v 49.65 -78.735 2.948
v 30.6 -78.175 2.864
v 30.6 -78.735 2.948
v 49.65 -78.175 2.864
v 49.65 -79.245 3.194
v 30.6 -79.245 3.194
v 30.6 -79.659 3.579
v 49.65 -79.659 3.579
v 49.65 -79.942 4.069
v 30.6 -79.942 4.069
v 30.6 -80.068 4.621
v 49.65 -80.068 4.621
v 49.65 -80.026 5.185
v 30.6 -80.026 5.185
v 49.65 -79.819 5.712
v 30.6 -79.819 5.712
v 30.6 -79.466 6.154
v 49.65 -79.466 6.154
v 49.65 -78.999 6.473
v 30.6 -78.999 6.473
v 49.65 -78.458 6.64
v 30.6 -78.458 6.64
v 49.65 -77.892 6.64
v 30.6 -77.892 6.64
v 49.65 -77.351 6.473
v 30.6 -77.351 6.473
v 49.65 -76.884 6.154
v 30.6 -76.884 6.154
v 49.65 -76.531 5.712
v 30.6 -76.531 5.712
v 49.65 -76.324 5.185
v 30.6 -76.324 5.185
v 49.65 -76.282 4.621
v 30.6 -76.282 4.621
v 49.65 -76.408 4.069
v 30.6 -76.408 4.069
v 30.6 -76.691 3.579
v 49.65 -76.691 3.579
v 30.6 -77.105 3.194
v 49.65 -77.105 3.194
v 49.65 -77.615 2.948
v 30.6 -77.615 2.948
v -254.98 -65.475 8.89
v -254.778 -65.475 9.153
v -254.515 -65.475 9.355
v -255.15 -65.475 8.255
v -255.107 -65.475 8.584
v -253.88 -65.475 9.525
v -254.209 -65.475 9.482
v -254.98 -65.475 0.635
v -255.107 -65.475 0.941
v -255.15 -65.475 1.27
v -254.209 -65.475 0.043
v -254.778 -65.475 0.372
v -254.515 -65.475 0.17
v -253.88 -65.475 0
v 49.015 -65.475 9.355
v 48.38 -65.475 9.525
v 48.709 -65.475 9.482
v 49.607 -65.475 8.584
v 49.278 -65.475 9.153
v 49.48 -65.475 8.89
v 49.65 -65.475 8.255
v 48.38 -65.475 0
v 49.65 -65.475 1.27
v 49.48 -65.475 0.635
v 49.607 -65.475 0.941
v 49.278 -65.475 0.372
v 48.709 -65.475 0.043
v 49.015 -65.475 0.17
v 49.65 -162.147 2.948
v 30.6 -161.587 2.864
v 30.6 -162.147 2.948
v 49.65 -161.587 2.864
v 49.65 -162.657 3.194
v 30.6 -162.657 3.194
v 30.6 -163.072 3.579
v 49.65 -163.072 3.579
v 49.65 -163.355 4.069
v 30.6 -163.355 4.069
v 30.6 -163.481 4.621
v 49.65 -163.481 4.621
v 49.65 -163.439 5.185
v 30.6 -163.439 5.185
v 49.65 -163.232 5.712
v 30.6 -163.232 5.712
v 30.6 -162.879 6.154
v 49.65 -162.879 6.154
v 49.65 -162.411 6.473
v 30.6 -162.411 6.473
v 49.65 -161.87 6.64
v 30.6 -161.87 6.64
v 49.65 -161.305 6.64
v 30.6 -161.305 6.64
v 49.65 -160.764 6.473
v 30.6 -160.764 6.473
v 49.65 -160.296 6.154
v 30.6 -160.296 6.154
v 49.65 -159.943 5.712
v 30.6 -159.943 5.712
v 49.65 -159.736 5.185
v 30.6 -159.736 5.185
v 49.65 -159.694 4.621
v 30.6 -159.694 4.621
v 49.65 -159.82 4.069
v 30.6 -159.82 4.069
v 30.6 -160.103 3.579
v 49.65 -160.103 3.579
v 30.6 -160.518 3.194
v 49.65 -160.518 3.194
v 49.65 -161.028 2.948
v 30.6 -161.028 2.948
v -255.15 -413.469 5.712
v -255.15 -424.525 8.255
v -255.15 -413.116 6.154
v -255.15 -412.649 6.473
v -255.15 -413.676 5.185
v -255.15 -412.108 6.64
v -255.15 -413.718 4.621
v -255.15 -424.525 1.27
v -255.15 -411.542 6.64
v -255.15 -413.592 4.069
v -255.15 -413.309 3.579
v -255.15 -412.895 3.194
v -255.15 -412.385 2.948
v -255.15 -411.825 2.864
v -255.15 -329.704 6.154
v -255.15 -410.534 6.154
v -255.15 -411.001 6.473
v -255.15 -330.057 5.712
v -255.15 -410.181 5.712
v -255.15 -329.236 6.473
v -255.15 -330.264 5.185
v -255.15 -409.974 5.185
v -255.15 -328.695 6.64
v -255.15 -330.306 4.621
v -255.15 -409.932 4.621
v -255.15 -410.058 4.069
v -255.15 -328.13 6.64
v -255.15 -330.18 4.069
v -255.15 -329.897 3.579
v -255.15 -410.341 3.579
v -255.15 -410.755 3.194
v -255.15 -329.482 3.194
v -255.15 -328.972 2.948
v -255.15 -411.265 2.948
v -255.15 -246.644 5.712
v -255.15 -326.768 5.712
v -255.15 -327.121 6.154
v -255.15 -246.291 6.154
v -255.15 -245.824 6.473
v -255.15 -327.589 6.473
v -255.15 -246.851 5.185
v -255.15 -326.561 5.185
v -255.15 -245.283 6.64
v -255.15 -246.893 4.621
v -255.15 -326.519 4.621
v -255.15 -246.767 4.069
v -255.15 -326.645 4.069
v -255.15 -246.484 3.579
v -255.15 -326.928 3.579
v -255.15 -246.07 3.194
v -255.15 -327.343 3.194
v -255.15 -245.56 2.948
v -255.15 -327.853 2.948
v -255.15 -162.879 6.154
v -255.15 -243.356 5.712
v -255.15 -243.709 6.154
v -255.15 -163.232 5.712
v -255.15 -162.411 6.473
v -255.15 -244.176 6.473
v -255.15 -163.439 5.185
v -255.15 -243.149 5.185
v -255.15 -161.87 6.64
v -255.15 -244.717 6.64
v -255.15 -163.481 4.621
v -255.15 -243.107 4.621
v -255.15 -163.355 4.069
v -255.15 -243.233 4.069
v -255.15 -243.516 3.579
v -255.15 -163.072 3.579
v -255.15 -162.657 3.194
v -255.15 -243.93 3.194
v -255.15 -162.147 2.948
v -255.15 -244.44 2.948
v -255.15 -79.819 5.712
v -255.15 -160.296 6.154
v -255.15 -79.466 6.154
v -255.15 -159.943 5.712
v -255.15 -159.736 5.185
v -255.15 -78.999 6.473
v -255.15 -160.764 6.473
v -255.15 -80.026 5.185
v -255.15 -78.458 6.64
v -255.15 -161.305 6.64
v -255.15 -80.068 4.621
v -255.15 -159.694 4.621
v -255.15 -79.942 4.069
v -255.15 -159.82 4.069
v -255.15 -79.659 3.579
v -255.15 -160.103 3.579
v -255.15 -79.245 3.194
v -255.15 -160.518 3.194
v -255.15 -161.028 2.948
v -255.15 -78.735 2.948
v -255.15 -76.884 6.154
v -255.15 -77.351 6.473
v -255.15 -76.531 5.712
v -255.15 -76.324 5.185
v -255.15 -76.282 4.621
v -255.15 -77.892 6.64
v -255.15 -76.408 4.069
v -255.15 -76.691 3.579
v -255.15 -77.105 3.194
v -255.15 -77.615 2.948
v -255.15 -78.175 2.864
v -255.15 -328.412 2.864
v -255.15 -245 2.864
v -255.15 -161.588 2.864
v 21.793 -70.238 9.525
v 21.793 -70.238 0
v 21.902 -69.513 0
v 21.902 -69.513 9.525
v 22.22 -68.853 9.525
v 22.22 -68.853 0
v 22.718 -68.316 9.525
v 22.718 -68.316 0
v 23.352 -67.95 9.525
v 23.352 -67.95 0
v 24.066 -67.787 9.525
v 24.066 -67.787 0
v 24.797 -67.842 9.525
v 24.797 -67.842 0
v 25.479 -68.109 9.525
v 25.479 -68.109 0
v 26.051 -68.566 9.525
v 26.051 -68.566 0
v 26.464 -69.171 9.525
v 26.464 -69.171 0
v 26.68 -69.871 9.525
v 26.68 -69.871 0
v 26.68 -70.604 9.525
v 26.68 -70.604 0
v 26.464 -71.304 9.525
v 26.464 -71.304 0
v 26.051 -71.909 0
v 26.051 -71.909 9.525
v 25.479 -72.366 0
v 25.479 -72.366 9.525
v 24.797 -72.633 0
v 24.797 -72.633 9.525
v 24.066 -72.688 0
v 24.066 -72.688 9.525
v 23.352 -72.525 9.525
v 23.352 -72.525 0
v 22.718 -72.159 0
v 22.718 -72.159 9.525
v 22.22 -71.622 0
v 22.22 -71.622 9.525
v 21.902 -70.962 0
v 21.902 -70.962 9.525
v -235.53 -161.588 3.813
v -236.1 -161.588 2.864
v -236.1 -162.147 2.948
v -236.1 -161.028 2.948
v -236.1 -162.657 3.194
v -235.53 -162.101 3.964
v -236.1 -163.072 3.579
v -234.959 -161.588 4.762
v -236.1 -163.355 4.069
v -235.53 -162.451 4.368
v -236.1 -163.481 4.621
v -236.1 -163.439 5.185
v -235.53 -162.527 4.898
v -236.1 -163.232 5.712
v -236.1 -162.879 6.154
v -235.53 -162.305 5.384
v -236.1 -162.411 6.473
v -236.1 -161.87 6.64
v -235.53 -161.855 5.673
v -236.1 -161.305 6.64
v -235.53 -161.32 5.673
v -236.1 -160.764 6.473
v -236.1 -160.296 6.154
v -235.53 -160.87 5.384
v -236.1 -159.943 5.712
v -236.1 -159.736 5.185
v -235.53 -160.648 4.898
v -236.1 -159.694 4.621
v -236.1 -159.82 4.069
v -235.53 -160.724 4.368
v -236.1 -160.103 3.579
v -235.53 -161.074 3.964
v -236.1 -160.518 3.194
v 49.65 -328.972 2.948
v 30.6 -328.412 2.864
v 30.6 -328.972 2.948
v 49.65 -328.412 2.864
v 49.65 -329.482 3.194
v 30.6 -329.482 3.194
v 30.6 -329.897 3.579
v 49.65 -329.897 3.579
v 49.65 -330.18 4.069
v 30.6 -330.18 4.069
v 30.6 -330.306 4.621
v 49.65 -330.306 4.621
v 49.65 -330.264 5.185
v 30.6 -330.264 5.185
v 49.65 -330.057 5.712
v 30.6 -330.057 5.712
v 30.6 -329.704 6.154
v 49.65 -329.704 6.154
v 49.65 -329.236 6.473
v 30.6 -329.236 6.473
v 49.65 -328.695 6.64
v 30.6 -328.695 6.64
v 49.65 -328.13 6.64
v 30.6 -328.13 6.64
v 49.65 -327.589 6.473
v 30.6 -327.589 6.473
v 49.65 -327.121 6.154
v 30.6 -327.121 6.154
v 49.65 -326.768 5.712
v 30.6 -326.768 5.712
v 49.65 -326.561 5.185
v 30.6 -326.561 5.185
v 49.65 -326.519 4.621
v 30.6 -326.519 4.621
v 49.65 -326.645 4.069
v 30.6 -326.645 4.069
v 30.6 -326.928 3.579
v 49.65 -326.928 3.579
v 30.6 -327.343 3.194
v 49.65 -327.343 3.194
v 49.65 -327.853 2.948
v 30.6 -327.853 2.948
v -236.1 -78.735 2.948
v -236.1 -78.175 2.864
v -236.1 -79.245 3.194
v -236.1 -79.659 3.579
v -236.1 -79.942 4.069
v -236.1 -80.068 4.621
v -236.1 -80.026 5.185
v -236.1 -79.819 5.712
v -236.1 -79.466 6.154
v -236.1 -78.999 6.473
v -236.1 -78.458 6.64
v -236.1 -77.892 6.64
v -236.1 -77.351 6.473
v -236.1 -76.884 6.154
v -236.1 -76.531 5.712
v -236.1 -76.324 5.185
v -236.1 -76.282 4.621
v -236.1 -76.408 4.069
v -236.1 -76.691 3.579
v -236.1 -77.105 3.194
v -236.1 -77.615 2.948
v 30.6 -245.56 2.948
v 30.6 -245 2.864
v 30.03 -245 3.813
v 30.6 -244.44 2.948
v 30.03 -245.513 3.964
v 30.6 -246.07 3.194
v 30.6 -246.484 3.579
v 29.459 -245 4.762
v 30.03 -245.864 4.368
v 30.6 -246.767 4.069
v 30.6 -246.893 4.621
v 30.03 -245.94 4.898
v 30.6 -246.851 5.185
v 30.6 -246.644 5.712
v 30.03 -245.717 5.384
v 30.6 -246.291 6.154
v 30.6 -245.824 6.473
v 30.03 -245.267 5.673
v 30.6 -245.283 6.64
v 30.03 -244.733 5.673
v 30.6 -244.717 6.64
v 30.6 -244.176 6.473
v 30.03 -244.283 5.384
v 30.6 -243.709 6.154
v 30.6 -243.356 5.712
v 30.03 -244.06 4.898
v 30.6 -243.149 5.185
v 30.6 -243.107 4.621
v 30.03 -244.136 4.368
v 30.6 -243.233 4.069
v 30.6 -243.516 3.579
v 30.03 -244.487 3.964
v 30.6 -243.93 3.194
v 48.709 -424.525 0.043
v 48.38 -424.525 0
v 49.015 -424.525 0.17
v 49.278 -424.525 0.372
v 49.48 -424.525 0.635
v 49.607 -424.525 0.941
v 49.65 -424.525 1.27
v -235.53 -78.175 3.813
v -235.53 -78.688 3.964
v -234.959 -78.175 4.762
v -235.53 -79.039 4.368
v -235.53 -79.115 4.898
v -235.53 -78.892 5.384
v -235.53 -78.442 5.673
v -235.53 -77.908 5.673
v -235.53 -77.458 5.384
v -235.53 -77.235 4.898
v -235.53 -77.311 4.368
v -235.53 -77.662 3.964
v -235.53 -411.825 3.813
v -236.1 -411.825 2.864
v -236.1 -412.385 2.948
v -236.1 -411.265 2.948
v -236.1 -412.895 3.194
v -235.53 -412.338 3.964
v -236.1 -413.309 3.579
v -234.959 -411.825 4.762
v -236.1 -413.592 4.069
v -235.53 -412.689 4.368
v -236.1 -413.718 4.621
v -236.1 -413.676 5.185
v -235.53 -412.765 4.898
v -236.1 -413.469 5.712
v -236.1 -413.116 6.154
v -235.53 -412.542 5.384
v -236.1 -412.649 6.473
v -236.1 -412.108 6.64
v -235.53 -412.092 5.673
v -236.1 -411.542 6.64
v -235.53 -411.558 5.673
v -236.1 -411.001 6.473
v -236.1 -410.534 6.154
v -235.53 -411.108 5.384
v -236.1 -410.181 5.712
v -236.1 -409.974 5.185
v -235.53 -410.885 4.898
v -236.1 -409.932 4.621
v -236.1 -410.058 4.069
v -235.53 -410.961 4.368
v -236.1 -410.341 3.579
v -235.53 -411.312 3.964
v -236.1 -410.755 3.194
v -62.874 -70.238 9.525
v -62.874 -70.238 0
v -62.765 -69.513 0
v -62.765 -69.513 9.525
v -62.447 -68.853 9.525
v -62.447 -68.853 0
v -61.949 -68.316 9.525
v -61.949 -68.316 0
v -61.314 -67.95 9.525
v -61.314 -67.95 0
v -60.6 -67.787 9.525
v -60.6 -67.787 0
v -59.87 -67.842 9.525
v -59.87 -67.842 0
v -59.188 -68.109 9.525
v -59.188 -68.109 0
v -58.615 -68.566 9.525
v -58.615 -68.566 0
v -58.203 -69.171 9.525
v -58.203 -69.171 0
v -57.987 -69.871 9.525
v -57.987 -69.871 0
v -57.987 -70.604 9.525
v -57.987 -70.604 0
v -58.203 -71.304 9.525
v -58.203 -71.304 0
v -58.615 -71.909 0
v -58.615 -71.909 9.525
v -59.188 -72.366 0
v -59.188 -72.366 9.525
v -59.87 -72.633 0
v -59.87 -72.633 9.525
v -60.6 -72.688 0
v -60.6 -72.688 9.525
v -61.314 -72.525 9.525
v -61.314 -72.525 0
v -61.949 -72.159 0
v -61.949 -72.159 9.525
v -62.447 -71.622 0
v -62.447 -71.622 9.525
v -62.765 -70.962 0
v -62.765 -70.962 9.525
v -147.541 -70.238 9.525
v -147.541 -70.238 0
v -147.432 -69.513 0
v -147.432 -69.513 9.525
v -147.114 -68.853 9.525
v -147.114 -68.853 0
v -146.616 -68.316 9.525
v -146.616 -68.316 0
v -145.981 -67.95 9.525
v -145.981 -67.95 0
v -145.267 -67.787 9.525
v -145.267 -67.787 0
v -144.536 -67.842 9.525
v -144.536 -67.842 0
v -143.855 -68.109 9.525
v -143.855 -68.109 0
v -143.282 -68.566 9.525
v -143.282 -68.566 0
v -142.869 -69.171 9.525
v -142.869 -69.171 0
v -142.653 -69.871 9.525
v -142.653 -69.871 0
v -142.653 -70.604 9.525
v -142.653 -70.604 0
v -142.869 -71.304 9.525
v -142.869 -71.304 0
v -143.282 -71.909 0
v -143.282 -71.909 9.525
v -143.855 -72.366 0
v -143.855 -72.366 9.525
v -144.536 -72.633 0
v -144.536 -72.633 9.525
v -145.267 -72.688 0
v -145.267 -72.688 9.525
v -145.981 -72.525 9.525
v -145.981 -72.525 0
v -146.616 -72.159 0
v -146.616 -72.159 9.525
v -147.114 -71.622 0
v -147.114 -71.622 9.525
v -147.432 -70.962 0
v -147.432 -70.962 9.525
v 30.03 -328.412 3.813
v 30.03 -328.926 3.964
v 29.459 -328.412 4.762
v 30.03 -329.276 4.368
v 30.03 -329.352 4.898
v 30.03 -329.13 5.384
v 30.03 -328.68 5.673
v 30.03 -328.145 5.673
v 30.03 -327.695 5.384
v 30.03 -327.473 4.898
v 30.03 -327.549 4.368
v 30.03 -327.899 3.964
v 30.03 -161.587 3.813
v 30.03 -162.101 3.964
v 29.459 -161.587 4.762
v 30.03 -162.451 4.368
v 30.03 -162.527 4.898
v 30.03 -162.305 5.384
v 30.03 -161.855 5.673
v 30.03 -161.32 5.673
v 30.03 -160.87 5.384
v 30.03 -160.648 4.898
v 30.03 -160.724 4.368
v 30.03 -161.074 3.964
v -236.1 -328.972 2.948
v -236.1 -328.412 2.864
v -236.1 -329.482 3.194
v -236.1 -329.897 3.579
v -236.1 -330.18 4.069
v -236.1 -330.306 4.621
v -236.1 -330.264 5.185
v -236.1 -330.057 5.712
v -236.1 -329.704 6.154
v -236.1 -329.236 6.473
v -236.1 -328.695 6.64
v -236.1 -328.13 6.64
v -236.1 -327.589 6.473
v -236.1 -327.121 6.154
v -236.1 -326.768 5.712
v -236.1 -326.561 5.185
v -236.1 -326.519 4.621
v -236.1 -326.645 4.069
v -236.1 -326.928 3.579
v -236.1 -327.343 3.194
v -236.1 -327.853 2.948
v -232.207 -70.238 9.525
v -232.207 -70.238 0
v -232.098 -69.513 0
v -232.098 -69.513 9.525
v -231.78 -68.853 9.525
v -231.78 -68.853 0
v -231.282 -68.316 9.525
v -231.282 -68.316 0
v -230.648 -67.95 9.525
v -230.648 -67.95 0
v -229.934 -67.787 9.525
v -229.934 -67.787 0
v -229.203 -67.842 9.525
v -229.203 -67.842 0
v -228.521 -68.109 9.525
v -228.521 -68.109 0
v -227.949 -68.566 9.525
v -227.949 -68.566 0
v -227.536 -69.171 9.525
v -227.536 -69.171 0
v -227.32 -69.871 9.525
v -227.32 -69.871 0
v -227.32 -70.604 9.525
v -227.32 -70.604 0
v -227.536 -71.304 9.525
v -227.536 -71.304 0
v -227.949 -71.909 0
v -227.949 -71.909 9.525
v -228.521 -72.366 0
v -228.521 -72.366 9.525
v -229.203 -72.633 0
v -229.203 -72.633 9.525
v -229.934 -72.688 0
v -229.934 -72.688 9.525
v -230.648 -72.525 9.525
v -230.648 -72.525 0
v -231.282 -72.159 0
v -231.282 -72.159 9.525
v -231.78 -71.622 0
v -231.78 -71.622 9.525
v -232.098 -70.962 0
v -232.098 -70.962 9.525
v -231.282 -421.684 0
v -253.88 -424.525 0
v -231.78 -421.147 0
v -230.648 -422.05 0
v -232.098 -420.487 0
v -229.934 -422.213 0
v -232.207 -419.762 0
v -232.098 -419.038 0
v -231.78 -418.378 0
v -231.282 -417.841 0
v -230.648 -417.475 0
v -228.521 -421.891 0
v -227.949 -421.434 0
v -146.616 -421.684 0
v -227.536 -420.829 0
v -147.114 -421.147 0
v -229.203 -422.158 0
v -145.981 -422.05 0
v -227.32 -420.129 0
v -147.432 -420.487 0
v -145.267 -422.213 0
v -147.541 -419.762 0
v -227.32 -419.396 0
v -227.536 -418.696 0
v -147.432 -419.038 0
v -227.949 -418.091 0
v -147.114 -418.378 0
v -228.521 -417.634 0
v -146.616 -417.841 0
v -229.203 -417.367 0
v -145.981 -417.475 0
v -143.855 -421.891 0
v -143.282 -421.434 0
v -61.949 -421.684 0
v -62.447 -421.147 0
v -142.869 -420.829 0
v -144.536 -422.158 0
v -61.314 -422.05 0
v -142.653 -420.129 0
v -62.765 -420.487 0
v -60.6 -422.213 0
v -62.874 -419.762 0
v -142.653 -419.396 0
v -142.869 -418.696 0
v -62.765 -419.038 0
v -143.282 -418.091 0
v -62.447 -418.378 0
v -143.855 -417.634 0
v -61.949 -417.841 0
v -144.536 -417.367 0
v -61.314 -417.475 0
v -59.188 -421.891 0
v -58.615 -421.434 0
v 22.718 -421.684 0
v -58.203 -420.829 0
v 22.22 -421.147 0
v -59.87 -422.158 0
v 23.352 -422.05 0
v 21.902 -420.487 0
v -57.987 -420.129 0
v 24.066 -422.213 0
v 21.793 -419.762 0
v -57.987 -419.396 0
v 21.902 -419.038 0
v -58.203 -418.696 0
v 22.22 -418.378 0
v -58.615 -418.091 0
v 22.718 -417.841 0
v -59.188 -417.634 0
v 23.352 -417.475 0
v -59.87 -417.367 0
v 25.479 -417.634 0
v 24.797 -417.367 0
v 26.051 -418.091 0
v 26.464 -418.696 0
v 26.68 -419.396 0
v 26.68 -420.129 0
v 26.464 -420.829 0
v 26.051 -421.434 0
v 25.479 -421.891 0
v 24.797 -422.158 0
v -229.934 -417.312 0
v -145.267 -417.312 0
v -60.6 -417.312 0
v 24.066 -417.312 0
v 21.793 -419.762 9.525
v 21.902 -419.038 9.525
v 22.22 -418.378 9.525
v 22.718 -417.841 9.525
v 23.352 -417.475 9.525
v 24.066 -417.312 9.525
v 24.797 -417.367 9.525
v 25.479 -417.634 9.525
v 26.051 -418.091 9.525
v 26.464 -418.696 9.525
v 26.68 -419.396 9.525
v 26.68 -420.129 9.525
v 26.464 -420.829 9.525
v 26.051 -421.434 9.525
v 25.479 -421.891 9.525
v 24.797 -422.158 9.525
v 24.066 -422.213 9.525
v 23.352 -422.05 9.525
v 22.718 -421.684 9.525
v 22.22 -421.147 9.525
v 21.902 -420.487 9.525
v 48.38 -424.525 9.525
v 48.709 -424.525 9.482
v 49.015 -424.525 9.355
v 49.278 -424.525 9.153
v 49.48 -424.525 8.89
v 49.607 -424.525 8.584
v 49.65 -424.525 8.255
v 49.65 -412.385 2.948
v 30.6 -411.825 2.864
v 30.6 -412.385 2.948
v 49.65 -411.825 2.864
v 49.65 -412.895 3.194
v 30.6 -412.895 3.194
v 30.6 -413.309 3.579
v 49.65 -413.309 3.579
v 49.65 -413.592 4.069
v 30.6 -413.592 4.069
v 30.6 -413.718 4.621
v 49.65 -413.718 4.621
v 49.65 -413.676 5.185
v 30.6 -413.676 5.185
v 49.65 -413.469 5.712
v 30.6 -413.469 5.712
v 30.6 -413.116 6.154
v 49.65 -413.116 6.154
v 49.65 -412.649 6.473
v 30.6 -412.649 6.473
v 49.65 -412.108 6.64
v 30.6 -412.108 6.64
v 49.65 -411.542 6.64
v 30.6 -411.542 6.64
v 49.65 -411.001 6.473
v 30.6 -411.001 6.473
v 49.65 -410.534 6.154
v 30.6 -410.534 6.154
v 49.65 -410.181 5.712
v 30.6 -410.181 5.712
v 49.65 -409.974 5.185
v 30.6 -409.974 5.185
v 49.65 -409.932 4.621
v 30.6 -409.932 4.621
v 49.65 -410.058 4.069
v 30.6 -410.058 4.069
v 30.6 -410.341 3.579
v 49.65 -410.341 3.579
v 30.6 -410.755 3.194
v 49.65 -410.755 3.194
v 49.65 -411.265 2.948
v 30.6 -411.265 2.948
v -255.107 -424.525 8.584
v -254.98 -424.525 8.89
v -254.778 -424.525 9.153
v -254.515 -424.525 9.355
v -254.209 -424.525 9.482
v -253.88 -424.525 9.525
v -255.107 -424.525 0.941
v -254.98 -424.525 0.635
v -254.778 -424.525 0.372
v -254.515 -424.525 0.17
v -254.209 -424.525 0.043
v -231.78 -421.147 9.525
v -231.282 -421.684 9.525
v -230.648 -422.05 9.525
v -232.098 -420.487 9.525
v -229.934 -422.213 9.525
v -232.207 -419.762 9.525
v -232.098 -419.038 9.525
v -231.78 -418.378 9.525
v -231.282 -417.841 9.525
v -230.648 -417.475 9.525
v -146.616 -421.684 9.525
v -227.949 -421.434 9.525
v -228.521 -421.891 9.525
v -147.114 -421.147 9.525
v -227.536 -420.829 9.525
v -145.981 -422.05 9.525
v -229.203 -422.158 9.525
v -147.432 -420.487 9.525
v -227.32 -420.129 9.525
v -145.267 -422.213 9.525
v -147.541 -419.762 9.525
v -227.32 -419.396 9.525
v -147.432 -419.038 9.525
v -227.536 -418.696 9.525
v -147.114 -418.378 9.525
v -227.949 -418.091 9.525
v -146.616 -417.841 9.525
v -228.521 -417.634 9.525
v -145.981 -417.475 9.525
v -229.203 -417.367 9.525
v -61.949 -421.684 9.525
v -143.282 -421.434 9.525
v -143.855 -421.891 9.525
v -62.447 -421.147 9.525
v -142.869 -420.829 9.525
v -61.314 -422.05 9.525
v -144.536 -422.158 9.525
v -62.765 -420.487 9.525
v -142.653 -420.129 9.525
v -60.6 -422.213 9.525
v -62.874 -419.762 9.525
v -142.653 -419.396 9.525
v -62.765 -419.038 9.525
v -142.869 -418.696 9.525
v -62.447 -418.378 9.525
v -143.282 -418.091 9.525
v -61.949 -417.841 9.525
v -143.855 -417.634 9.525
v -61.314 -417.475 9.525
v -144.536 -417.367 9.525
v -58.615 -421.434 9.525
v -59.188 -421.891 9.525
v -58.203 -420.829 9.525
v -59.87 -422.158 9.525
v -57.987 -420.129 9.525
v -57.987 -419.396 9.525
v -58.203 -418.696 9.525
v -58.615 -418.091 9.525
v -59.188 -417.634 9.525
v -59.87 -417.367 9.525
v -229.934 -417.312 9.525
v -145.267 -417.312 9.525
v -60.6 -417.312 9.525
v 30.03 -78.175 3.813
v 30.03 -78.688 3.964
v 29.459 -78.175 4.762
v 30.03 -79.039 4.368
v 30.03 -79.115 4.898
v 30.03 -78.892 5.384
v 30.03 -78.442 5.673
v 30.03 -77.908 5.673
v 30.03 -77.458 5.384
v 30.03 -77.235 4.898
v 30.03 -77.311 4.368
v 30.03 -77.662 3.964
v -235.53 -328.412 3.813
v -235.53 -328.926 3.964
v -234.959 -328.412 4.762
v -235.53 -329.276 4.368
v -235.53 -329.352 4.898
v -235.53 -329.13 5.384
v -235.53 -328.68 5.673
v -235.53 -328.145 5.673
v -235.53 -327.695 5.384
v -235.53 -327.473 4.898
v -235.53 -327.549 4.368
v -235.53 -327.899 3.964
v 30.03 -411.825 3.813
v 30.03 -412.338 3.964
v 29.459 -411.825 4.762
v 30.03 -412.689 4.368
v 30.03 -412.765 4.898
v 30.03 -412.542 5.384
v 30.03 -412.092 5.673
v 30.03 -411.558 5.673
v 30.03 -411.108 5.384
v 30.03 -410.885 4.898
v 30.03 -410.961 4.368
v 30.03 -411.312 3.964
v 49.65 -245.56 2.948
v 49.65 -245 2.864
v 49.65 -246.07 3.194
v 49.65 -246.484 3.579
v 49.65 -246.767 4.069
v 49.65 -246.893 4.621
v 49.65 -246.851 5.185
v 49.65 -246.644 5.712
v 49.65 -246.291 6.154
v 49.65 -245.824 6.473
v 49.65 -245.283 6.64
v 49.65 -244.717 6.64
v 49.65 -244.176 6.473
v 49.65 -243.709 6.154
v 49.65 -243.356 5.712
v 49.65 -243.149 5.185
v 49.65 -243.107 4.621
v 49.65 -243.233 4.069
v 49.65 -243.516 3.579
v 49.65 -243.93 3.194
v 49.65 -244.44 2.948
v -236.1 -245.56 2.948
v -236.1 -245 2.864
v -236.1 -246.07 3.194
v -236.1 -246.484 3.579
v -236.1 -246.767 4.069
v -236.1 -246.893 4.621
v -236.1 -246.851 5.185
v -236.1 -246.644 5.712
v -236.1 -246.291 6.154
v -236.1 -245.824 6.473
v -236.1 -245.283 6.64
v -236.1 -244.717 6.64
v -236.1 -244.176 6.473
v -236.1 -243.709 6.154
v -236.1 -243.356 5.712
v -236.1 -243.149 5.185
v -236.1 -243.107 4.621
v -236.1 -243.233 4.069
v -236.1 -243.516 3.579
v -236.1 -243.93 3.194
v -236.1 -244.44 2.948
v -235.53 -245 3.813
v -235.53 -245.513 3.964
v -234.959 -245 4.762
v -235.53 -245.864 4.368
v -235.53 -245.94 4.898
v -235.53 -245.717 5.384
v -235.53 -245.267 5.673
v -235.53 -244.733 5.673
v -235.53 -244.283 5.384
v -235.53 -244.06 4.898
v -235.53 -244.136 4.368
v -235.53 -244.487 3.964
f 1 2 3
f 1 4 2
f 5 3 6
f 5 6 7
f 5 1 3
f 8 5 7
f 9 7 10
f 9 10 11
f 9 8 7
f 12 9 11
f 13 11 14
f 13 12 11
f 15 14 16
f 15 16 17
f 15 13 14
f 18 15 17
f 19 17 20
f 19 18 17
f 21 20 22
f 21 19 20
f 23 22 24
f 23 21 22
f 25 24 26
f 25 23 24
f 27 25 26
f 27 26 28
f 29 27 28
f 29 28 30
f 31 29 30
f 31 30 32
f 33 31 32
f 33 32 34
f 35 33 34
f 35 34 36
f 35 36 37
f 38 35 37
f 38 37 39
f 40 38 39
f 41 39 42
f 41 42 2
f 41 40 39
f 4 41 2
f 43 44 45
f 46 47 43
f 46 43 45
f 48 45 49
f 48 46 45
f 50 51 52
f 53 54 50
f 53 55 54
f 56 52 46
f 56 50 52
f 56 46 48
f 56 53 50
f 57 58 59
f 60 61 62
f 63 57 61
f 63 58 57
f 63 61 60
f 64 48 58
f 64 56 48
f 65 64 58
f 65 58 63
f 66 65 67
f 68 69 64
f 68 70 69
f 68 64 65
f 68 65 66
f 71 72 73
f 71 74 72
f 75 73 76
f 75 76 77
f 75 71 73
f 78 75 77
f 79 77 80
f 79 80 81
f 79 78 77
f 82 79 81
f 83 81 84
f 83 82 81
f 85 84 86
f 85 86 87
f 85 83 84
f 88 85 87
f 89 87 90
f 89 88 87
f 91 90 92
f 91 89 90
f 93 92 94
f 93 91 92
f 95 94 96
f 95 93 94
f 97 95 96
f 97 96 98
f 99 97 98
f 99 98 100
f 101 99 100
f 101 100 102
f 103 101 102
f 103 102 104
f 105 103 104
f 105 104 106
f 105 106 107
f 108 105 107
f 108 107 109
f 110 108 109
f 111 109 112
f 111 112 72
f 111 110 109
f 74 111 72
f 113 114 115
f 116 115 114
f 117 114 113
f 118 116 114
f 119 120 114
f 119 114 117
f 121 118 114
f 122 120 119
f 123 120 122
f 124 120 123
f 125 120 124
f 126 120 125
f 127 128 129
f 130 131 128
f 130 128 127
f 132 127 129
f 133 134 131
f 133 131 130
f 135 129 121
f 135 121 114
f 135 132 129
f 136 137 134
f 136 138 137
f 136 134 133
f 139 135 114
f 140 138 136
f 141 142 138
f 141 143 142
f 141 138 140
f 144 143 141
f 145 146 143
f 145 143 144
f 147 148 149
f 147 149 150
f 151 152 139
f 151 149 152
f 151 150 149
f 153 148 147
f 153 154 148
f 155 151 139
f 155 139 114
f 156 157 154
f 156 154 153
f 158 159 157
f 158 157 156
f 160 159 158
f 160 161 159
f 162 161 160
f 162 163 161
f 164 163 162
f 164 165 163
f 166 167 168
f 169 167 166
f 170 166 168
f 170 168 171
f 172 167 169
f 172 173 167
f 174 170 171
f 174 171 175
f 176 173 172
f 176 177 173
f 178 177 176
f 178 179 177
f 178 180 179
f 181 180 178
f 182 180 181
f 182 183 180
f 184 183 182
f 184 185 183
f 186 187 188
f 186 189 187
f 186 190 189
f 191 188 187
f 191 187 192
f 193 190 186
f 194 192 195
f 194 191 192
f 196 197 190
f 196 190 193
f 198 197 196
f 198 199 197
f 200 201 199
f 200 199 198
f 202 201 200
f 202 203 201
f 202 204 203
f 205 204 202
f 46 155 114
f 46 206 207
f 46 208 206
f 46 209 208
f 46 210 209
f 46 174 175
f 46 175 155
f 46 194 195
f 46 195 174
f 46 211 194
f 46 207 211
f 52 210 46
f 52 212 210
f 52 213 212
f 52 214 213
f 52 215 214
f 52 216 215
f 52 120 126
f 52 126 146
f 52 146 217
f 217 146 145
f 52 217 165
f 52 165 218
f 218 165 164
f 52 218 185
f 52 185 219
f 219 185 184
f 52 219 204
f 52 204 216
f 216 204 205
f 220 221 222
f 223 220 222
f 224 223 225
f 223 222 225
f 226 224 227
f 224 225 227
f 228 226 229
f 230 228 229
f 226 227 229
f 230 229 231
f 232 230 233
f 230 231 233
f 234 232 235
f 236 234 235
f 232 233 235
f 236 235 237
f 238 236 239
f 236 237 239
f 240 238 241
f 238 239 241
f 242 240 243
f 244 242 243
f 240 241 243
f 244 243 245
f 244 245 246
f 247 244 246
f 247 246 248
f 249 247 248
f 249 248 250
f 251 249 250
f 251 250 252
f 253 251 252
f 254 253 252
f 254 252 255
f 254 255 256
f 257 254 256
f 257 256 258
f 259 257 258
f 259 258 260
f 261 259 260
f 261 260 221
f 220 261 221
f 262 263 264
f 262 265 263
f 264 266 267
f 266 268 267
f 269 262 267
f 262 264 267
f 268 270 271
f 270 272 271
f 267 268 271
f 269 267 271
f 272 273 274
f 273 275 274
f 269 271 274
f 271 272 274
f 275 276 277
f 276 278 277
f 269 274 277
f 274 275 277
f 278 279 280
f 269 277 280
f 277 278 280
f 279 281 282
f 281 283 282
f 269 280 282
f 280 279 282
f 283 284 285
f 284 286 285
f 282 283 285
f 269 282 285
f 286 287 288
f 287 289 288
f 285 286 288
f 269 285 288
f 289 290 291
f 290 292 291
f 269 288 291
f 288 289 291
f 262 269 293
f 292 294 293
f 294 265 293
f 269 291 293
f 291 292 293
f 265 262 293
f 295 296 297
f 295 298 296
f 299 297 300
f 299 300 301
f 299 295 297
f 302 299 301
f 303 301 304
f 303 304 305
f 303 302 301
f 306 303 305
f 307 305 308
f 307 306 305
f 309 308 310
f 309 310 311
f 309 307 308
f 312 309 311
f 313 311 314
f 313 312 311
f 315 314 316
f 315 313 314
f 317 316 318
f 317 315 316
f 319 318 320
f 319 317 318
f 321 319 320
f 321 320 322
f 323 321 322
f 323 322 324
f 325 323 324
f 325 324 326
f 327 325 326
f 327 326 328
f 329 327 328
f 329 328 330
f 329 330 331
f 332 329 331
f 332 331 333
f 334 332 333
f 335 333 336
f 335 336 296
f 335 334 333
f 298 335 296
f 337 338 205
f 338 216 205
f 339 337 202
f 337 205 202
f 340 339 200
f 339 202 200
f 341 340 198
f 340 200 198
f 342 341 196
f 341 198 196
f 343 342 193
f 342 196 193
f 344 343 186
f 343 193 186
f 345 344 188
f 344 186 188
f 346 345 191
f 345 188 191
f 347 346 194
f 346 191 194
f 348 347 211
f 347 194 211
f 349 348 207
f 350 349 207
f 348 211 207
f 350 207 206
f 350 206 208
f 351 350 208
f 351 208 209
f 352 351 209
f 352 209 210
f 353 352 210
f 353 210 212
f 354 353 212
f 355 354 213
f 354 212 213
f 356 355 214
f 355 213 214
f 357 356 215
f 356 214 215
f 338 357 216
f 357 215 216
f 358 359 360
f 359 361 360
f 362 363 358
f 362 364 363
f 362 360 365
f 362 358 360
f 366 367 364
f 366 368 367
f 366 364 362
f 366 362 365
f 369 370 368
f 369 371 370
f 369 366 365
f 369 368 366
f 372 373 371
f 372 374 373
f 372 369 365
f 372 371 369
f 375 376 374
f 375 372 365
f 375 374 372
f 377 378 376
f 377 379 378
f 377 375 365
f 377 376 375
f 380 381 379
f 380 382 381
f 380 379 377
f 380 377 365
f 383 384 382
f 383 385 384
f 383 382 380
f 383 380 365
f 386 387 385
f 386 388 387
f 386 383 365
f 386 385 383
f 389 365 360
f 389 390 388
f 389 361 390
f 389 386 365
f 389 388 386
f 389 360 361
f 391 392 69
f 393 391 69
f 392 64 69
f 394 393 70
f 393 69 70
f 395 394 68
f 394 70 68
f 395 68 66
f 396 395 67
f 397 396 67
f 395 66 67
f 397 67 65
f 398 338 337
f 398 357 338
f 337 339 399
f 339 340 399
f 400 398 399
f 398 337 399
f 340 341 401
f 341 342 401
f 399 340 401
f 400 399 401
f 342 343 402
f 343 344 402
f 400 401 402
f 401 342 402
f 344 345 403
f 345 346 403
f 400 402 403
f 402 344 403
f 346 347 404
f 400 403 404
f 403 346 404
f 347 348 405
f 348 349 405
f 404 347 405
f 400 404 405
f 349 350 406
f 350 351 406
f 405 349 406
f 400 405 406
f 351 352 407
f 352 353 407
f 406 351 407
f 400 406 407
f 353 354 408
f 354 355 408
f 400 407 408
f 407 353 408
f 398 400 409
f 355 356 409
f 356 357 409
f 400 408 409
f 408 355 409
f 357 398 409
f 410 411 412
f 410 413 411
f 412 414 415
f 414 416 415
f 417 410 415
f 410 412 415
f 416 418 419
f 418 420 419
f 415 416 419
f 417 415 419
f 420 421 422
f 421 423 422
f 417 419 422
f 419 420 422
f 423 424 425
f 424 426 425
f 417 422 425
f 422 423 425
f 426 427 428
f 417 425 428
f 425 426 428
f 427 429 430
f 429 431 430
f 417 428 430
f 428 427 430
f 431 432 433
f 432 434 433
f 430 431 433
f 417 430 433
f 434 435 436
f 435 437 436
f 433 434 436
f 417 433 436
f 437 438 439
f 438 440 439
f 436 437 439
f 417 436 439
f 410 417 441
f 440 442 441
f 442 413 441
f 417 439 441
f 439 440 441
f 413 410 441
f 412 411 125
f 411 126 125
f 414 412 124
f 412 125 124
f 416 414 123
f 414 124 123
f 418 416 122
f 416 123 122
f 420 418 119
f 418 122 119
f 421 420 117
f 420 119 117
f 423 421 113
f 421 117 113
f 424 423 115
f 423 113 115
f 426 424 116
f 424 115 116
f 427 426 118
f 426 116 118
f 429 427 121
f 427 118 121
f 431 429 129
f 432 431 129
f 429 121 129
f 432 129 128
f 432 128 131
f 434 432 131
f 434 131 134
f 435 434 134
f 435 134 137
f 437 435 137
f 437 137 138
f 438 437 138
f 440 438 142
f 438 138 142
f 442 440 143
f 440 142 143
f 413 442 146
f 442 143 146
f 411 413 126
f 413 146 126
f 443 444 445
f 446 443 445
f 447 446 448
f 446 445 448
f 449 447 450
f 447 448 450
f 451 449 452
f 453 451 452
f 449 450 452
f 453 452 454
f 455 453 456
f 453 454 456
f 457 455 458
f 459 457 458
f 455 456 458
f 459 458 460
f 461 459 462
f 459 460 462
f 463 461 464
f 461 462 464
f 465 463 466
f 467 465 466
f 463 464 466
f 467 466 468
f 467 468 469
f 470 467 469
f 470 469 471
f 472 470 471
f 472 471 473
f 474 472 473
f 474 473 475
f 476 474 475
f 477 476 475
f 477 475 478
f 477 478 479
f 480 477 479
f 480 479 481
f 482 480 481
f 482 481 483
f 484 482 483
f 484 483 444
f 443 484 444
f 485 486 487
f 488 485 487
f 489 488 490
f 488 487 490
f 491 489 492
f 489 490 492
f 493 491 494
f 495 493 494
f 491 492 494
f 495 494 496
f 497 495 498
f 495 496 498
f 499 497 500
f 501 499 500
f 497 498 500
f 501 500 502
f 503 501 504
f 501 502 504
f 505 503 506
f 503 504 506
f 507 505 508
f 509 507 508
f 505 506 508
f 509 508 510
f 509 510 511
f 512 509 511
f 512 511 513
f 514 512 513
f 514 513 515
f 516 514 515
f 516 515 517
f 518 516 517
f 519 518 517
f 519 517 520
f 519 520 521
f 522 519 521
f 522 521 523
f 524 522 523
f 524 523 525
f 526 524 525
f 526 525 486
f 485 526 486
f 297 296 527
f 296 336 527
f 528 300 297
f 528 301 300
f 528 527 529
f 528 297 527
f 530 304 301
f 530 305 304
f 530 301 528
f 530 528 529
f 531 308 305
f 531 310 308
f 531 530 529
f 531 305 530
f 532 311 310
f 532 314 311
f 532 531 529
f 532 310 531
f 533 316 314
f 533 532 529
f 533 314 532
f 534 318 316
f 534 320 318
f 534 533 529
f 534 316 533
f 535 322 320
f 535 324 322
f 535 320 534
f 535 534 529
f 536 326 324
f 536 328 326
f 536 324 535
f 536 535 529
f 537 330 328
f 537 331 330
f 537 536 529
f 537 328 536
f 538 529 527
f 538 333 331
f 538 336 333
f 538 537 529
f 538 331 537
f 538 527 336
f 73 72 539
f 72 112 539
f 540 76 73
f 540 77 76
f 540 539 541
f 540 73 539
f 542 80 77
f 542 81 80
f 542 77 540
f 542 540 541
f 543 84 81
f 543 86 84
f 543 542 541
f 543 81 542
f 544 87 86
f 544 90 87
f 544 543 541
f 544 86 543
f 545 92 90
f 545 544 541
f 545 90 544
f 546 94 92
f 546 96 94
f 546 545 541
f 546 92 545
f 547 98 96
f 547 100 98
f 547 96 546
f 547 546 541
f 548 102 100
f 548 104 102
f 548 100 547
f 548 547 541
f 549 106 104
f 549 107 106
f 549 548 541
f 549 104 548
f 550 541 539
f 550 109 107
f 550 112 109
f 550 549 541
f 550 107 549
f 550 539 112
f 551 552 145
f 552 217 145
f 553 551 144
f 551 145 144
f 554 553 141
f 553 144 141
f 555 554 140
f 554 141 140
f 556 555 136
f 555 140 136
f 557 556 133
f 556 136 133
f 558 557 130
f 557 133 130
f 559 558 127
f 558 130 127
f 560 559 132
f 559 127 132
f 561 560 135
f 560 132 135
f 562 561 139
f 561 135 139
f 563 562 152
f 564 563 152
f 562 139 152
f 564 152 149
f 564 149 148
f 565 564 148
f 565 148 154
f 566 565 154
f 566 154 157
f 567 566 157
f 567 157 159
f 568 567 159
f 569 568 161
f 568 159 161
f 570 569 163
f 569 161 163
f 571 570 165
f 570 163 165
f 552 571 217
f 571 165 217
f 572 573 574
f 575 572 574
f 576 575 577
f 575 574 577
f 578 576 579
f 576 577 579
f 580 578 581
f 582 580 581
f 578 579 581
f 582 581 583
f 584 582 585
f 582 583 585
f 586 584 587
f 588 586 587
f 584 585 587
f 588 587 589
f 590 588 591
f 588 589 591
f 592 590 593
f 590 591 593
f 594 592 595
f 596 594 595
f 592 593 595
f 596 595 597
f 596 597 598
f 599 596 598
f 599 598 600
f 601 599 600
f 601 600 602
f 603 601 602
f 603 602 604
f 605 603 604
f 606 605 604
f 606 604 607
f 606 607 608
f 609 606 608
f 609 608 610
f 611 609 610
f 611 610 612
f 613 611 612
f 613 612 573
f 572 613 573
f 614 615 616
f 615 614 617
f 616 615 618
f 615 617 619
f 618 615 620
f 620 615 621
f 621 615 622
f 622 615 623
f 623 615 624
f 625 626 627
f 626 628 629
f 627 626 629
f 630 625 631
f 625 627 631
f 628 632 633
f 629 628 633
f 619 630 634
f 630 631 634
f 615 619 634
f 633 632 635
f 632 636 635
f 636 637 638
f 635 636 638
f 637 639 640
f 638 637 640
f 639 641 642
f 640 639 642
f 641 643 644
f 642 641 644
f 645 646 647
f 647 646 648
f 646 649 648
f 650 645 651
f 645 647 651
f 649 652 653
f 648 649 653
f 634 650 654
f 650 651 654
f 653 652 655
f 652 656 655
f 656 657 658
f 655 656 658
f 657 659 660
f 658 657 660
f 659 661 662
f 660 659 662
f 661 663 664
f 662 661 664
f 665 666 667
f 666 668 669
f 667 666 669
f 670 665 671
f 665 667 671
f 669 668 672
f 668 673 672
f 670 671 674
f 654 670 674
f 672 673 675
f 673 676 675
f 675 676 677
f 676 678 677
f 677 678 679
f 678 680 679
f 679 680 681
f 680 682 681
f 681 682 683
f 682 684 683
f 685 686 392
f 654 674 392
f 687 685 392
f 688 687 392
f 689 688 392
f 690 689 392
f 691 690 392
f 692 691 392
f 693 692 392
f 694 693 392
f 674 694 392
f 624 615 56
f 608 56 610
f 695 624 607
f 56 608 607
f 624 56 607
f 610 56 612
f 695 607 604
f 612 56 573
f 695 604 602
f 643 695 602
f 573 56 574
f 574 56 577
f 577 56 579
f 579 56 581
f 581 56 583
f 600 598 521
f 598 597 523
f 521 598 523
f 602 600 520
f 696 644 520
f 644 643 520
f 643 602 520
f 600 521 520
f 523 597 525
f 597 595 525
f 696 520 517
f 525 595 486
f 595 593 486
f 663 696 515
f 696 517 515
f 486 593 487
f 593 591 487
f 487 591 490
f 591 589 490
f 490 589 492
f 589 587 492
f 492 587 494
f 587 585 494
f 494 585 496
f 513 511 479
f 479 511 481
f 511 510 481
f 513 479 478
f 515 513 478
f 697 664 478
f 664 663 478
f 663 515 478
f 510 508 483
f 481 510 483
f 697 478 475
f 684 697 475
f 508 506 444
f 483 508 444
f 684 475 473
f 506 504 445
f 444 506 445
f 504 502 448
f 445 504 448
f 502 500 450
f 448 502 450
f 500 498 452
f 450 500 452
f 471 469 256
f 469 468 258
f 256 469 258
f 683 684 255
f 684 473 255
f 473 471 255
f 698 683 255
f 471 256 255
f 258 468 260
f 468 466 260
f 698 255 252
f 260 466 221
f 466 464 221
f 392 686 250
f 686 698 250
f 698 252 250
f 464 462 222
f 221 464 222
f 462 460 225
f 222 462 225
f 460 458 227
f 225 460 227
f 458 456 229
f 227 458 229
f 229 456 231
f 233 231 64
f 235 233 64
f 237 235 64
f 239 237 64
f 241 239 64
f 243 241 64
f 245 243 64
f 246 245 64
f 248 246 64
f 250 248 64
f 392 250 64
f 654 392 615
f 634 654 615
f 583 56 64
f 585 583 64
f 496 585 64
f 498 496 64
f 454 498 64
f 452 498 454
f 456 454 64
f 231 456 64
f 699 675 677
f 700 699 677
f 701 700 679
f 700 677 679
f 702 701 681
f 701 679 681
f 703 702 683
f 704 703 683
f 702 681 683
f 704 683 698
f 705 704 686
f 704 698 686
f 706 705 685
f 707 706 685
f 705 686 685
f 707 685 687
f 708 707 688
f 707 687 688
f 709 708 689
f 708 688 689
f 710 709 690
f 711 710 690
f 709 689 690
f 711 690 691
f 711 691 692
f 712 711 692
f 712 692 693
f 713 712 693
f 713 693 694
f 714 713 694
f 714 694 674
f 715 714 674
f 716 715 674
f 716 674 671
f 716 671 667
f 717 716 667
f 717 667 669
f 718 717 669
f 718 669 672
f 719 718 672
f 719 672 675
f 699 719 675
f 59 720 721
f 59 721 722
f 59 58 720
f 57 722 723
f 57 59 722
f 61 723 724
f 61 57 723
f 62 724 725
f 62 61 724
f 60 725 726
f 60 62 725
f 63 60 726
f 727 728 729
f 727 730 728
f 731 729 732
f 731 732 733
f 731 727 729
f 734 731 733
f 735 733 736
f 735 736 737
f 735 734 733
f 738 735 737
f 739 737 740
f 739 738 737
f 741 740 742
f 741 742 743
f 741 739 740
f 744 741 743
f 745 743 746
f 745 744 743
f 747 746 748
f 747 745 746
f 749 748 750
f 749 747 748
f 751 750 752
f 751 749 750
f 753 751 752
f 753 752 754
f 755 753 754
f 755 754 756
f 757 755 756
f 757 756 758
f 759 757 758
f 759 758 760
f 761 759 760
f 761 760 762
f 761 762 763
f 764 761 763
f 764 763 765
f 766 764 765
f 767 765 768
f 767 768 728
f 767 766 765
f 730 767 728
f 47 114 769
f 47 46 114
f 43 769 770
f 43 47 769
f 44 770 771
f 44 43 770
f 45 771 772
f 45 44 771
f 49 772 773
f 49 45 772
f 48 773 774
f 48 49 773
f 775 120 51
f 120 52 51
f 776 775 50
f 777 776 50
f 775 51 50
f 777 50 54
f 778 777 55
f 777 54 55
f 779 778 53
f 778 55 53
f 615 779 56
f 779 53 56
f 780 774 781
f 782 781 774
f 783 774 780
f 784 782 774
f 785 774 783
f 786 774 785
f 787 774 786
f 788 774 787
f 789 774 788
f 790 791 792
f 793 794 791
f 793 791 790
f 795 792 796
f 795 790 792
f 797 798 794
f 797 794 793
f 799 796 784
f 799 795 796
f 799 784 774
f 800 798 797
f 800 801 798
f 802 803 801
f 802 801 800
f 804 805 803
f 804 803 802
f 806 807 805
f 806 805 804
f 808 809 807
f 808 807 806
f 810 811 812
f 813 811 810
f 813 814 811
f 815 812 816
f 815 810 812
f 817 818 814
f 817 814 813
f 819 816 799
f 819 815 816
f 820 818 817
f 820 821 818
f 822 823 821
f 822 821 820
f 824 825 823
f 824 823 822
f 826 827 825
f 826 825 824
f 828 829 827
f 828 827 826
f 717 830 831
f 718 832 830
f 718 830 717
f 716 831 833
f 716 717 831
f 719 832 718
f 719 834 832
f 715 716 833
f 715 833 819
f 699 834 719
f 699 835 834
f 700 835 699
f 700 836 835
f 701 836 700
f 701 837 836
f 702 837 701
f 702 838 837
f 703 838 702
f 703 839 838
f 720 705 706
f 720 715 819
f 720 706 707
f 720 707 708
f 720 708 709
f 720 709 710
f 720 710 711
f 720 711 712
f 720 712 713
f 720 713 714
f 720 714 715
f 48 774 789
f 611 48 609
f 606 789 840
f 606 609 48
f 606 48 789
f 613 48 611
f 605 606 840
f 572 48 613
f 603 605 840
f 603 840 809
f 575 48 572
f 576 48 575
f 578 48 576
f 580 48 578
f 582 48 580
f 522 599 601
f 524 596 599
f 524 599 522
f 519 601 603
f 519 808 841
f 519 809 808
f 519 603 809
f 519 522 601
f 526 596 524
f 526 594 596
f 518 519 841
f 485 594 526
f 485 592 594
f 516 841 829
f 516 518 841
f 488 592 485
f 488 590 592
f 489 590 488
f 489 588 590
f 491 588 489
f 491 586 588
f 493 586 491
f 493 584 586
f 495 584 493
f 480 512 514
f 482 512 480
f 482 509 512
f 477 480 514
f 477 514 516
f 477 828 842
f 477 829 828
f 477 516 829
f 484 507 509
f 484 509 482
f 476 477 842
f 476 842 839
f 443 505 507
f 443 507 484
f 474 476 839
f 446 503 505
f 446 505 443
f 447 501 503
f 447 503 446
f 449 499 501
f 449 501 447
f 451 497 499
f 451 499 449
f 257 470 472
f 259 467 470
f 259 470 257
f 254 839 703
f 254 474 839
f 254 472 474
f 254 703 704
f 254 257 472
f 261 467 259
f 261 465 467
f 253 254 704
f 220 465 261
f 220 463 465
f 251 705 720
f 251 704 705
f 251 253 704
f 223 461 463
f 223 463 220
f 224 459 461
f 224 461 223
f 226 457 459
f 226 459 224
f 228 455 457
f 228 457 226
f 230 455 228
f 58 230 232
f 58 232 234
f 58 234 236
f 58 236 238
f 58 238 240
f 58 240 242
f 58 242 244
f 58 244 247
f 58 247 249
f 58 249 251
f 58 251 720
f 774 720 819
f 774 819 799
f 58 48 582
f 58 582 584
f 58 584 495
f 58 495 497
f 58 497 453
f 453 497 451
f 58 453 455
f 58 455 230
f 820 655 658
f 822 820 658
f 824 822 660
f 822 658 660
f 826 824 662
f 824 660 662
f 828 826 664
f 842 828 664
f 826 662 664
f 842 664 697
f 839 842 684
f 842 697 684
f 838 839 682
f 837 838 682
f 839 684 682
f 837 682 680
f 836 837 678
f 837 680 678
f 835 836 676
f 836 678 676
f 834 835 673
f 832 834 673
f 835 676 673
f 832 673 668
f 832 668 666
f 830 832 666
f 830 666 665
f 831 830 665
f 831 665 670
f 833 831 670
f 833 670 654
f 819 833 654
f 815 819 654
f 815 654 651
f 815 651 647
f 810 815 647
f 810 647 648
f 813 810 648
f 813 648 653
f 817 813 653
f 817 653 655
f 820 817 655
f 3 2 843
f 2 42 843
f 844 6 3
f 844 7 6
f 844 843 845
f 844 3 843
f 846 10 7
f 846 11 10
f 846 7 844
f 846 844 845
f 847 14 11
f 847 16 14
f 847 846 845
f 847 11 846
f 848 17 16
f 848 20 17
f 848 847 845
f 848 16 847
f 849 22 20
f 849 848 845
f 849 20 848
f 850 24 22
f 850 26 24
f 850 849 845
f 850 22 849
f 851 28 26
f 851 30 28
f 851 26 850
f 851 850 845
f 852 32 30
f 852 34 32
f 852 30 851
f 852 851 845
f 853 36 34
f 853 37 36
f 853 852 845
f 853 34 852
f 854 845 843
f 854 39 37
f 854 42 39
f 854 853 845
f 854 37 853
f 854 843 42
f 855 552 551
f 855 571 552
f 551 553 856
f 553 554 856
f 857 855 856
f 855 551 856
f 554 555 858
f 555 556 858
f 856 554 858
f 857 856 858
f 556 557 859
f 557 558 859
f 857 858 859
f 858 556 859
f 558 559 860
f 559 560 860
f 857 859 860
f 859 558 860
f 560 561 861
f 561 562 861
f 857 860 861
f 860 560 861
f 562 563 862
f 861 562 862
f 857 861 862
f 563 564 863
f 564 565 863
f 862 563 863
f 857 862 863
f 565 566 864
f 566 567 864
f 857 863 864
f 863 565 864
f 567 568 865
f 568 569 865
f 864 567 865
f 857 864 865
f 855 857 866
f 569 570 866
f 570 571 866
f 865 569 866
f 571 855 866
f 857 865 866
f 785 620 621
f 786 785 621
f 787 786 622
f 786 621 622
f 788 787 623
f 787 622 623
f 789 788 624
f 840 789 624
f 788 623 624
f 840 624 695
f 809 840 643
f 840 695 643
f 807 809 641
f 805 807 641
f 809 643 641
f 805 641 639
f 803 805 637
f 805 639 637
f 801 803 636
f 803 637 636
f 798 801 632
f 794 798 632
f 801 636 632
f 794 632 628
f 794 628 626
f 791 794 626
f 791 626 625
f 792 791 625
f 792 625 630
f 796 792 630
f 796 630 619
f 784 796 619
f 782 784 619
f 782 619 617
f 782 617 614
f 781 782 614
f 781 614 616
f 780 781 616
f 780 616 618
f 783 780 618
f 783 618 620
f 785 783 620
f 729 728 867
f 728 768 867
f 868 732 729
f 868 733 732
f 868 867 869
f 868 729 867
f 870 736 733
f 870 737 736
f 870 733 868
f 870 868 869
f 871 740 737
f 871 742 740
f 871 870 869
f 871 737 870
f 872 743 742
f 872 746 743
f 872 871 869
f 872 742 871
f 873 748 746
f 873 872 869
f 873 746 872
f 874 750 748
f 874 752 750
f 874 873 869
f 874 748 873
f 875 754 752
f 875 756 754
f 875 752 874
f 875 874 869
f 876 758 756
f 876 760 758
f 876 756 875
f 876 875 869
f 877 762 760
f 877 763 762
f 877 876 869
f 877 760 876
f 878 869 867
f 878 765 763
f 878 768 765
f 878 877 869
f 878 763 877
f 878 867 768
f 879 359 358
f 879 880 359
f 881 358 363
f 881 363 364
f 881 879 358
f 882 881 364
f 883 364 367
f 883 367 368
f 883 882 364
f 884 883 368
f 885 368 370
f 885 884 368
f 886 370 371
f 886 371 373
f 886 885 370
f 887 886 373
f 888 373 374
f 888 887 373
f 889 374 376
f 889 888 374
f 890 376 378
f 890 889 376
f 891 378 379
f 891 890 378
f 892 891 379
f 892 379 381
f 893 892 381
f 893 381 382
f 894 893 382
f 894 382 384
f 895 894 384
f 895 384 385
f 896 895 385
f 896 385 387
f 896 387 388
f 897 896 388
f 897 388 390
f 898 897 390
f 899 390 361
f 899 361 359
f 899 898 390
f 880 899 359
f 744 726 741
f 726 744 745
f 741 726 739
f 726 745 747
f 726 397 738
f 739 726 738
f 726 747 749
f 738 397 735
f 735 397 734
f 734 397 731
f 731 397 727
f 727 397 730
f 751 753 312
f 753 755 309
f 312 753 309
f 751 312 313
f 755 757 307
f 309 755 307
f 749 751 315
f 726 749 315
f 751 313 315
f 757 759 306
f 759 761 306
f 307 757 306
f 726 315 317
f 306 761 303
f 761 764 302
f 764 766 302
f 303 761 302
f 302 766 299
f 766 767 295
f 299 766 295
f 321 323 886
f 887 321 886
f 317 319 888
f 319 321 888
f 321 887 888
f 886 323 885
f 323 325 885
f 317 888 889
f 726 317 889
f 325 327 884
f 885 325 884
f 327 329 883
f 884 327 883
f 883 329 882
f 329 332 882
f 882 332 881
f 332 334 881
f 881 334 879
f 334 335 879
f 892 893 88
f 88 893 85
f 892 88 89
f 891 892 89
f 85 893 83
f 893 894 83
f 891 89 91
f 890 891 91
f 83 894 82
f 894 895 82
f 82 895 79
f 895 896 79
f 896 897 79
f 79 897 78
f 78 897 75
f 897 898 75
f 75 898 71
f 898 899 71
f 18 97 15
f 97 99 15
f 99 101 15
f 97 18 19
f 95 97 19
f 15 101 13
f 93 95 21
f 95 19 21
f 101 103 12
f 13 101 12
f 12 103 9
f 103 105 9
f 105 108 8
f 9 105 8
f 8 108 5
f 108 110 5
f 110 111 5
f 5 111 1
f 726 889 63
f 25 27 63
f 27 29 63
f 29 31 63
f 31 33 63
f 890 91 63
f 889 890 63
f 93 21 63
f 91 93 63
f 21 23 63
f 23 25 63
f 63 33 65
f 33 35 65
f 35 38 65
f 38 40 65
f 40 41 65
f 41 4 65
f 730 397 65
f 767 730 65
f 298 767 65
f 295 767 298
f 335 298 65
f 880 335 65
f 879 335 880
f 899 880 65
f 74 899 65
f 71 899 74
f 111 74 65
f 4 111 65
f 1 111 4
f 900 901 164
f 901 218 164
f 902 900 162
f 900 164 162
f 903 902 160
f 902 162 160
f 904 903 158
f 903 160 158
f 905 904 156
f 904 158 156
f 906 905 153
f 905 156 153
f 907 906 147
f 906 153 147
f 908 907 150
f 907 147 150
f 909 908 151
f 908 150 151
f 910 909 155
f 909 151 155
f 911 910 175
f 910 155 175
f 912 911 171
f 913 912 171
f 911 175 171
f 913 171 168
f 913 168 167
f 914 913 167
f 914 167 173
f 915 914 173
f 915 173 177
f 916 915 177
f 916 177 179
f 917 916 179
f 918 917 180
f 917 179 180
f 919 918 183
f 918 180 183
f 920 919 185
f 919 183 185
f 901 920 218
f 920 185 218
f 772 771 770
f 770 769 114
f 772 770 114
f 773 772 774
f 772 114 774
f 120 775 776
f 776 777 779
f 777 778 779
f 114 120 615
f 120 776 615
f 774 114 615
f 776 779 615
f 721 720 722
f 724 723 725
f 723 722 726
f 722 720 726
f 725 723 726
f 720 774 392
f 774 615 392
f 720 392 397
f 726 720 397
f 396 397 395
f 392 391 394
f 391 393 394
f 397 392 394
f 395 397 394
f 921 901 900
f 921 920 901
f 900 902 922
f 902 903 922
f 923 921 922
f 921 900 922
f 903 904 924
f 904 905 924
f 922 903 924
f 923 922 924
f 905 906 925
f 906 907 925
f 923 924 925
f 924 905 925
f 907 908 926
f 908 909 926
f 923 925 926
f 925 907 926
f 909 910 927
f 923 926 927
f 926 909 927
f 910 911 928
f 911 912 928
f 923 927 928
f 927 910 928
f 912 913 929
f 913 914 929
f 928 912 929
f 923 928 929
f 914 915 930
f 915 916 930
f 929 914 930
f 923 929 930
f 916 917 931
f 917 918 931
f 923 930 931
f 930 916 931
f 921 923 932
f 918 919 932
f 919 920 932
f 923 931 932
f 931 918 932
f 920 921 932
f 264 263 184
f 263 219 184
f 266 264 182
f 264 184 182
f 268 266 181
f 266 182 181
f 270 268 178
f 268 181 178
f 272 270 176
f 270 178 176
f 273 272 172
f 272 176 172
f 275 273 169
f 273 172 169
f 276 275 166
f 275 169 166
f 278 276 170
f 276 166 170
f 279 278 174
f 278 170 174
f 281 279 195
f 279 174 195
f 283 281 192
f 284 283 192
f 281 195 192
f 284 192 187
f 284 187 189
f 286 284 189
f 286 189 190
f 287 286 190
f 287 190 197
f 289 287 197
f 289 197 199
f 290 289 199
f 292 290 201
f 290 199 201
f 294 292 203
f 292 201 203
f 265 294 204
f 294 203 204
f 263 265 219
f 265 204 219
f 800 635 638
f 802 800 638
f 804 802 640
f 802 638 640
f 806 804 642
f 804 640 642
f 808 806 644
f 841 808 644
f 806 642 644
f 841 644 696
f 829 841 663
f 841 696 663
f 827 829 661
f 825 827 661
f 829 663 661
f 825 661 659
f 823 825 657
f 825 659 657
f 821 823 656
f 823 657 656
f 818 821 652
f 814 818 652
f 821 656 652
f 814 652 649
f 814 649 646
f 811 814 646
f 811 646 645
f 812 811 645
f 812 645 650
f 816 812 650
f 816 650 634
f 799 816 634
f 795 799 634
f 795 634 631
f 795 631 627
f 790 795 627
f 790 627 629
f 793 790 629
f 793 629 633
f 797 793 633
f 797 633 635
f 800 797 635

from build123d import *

# Parameters (mm, degrees)
SKETCH1_W                       = 304.8
SKETCH1_H                       = 359.05
BOSS_EXTRUDE1_DEPTH             = 9.525
F_10_24_TAPPED_HOLE1_AT_2_COUNT = 2
F_10_24_TAPPED_HOLE1_AT_2_PITCH = 83.4125
F_10_24_TAPPED_HOLE1_AT_3_COUNT = 2
F_10_24_TAPPED_HOLE1_AT_3_PITCH = 166.825
F_10_24_TAPPED_HOLE1_AT_4_COUNT = 2
F_10_24_TAPPED_HOLE1_AT_4_PITCH = 250.2375
F_10_24_TAPPED_HOLE1_AT_5_COUNT = 2
F_10_24_TAPPED_HOLE1_AT_5_PITCH = 333.65
F_10_0_1935_DIAMETER_HOLE2_D    = 4.9149
FILLET2_R                       = 1.27


with BuildPart() as part:
    # Sketch1 → Boss-Extrude1 (new body)
    with BuildSketch(Plane.XY):
        with Locations((-102.750000669, -245)):
            Rectangle(SKETCH1_W, SKETCH1_H)
    extrude(amount=BOSS_EXTRUDE1_DEPTH)

    # Sketch3 → #10-24 Tapped Hole1 (revolve, cut)
    with BuildSketch(Plane(origin=(49.649999331, -411.825, 4.7625), x_dir=(0, 0, -1), z_dir=(0, 1, 0))):
        Polygon((0, 0), (0, 20.190824014), (1.89865, 19.05), (1.89865, 0), align=None)
    f_10_24_tapped_hole1 = revolve(axis=Axis((55.999999331, -411.825, 4.7625), (-1, 0, 0)), mode=Mode.SUBTRACT)

    # #10-24 Tapped Hole1 at 2: #10-24 Tapped Hole1 ×2
    with Locations(*[(0, i * F_10_24_TAPPED_HOLE1_AT_2_PITCH, 0) for i in range(1, F_10_24_TAPPED_HOLE1_AT_2_COUNT)]):
        add(f_10_24_tapped_hole1, mode=Mode.SUBTRACT)

    # #10-24 Tapped Hole1 at 3: #10-24 Tapped Hole1 ×2
    with Locations(*[(0, i * F_10_24_TAPPED_HOLE1_AT_3_PITCH, 0) for i in range(1, F_10_24_TAPPED_HOLE1_AT_3_COUNT)]):
        add(f_10_24_tapped_hole1, mode=Mode.SUBTRACT)

    # #10-24 Tapped Hole1 at 4: #10-24 Tapped Hole1 ×2
    with Locations(*[(0, i * F_10_24_TAPPED_HOLE1_AT_4_PITCH, 0) for i in range(1, F_10_24_TAPPED_HOLE1_AT_4_COUNT)]):
        add(f_10_24_tapped_hole1, mode=Mode.SUBTRACT)

    # #10-24 Tapped Hole1 at 5: #10-24 Tapped Hole1 ×2
    with Locations(*[(0, i * F_10_24_TAPPED_HOLE1_AT_5_PITCH, 0) for i in range(1, F_10_24_TAPPED_HOLE1_AT_5_COUNT)]):
        add(f_10_24_tapped_hole1, mode=Mode.SUBTRACT)

    # #10 (0.1935) Diameter Hole2 (through all)
    with Locations(Plane.XY.offset(9.525)):
        with Locations((-229.750000669, -70.2375), (-145.083334002, -70.2375), (-60.416667336, -70.2375), (24.249999331, -70.2375), (-229.750000669, -419.7625), (-145.083334002, -419.7625), (-60.416667336, -419.7625), (24.249999331, -419.7625)):
            Hole(F_10_0_1935_DIAMETER_HOLE2_D / 2)

    # Mirror1: #10-24 Tapped Hole1 across plane
    add(f_10_24_tapped_hole1.mirror(Plane(origin=(-102.750000669, 0, 0), x_dir=(0, 0, 1), z_dir=(1, 0, 0))), mode=Mode.SUBTRACT)

    # Mirror1 copy 1 sketch → Mirror1 copy 1 (revolve, cut)
    with BuildSketch(Plane(origin=(-255.150000669, -328.4125, 4.7625), x_dir=(0, 0, -1), z_dir=(0, 1, 0))):
        Polygon((0, 0), (0, -20.190824014), (1.89865, -19.05), (1.89865, 0), align=None)
    revolve(axis=Axis((-261.500000669, -328.4125, 4.7625), (-1, 0, 0)), mode=Mode.SUBTRACT)

    # Mirror1 copy 2 sketch → Mirror1 copy 2 (revolve, cut)
    with BuildSketch(Plane(origin=(-255.150000669, -245, 4.7625), x_dir=(0, 0, -1), z_dir=(0, 1, 0))):
        Polygon((0, 0), (0, -20.190824014), (1.89865, -19.05), (1.89865, 0), align=None)
    revolve(axis=Axis((-261.500000669, -245, 4.7625), (-1, 0, 0)), mode=Mode.SUBTRACT)

    # Mirror1 copy 3 sketch → Mirror1 copy 3 (revolve, cut)
    with BuildSketch(Plane(origin=(-255.150000669, -161.5875, 4.7625), x_dir=(0, 0, -1), z_dir=(0, 1, 0))):
        Polygon((0, 0), (0, -20.190824014), (1.89865, -19.05), (1.89865, 0), align=None)
    revolve(axis=Axis((-261.500000669, -161.5875, 4.7625), (-1, 0, 0)), mode=Mode.SUBTRACT)

    # Mirror1 copy 4 sketch → Mirror1 copy 4 (revolve, cut)
    with BuildSketch(Plane(origin=(-255.150000669, -78.175, 4.7625), x_dir=(0, 0, -1), z_dir=(0, 1, 0))):
        Polygon((0, 0), (0, -20.190824014), (1.89865, -19.05), (1.89865, 0), align=None)
    revolve(axis=Axis((-261.500000669, -78.175, 4.7625), (-1, 0, 0)), mode=Mode.SUBTRACT)

    # Fillet2
    fillet2_edges = [part.edges().sort_by_distance(p)[0] for p in [
        (-255.150000669, -245, 9.525),
        (49.649999331, -245, 9.525),
        (-255.150000669, -245, 0),
        (49.649999331, -245, 0),
    ]]
    fillet(fillet2_edges, radius=FILLET2_R)


solid = part.part
